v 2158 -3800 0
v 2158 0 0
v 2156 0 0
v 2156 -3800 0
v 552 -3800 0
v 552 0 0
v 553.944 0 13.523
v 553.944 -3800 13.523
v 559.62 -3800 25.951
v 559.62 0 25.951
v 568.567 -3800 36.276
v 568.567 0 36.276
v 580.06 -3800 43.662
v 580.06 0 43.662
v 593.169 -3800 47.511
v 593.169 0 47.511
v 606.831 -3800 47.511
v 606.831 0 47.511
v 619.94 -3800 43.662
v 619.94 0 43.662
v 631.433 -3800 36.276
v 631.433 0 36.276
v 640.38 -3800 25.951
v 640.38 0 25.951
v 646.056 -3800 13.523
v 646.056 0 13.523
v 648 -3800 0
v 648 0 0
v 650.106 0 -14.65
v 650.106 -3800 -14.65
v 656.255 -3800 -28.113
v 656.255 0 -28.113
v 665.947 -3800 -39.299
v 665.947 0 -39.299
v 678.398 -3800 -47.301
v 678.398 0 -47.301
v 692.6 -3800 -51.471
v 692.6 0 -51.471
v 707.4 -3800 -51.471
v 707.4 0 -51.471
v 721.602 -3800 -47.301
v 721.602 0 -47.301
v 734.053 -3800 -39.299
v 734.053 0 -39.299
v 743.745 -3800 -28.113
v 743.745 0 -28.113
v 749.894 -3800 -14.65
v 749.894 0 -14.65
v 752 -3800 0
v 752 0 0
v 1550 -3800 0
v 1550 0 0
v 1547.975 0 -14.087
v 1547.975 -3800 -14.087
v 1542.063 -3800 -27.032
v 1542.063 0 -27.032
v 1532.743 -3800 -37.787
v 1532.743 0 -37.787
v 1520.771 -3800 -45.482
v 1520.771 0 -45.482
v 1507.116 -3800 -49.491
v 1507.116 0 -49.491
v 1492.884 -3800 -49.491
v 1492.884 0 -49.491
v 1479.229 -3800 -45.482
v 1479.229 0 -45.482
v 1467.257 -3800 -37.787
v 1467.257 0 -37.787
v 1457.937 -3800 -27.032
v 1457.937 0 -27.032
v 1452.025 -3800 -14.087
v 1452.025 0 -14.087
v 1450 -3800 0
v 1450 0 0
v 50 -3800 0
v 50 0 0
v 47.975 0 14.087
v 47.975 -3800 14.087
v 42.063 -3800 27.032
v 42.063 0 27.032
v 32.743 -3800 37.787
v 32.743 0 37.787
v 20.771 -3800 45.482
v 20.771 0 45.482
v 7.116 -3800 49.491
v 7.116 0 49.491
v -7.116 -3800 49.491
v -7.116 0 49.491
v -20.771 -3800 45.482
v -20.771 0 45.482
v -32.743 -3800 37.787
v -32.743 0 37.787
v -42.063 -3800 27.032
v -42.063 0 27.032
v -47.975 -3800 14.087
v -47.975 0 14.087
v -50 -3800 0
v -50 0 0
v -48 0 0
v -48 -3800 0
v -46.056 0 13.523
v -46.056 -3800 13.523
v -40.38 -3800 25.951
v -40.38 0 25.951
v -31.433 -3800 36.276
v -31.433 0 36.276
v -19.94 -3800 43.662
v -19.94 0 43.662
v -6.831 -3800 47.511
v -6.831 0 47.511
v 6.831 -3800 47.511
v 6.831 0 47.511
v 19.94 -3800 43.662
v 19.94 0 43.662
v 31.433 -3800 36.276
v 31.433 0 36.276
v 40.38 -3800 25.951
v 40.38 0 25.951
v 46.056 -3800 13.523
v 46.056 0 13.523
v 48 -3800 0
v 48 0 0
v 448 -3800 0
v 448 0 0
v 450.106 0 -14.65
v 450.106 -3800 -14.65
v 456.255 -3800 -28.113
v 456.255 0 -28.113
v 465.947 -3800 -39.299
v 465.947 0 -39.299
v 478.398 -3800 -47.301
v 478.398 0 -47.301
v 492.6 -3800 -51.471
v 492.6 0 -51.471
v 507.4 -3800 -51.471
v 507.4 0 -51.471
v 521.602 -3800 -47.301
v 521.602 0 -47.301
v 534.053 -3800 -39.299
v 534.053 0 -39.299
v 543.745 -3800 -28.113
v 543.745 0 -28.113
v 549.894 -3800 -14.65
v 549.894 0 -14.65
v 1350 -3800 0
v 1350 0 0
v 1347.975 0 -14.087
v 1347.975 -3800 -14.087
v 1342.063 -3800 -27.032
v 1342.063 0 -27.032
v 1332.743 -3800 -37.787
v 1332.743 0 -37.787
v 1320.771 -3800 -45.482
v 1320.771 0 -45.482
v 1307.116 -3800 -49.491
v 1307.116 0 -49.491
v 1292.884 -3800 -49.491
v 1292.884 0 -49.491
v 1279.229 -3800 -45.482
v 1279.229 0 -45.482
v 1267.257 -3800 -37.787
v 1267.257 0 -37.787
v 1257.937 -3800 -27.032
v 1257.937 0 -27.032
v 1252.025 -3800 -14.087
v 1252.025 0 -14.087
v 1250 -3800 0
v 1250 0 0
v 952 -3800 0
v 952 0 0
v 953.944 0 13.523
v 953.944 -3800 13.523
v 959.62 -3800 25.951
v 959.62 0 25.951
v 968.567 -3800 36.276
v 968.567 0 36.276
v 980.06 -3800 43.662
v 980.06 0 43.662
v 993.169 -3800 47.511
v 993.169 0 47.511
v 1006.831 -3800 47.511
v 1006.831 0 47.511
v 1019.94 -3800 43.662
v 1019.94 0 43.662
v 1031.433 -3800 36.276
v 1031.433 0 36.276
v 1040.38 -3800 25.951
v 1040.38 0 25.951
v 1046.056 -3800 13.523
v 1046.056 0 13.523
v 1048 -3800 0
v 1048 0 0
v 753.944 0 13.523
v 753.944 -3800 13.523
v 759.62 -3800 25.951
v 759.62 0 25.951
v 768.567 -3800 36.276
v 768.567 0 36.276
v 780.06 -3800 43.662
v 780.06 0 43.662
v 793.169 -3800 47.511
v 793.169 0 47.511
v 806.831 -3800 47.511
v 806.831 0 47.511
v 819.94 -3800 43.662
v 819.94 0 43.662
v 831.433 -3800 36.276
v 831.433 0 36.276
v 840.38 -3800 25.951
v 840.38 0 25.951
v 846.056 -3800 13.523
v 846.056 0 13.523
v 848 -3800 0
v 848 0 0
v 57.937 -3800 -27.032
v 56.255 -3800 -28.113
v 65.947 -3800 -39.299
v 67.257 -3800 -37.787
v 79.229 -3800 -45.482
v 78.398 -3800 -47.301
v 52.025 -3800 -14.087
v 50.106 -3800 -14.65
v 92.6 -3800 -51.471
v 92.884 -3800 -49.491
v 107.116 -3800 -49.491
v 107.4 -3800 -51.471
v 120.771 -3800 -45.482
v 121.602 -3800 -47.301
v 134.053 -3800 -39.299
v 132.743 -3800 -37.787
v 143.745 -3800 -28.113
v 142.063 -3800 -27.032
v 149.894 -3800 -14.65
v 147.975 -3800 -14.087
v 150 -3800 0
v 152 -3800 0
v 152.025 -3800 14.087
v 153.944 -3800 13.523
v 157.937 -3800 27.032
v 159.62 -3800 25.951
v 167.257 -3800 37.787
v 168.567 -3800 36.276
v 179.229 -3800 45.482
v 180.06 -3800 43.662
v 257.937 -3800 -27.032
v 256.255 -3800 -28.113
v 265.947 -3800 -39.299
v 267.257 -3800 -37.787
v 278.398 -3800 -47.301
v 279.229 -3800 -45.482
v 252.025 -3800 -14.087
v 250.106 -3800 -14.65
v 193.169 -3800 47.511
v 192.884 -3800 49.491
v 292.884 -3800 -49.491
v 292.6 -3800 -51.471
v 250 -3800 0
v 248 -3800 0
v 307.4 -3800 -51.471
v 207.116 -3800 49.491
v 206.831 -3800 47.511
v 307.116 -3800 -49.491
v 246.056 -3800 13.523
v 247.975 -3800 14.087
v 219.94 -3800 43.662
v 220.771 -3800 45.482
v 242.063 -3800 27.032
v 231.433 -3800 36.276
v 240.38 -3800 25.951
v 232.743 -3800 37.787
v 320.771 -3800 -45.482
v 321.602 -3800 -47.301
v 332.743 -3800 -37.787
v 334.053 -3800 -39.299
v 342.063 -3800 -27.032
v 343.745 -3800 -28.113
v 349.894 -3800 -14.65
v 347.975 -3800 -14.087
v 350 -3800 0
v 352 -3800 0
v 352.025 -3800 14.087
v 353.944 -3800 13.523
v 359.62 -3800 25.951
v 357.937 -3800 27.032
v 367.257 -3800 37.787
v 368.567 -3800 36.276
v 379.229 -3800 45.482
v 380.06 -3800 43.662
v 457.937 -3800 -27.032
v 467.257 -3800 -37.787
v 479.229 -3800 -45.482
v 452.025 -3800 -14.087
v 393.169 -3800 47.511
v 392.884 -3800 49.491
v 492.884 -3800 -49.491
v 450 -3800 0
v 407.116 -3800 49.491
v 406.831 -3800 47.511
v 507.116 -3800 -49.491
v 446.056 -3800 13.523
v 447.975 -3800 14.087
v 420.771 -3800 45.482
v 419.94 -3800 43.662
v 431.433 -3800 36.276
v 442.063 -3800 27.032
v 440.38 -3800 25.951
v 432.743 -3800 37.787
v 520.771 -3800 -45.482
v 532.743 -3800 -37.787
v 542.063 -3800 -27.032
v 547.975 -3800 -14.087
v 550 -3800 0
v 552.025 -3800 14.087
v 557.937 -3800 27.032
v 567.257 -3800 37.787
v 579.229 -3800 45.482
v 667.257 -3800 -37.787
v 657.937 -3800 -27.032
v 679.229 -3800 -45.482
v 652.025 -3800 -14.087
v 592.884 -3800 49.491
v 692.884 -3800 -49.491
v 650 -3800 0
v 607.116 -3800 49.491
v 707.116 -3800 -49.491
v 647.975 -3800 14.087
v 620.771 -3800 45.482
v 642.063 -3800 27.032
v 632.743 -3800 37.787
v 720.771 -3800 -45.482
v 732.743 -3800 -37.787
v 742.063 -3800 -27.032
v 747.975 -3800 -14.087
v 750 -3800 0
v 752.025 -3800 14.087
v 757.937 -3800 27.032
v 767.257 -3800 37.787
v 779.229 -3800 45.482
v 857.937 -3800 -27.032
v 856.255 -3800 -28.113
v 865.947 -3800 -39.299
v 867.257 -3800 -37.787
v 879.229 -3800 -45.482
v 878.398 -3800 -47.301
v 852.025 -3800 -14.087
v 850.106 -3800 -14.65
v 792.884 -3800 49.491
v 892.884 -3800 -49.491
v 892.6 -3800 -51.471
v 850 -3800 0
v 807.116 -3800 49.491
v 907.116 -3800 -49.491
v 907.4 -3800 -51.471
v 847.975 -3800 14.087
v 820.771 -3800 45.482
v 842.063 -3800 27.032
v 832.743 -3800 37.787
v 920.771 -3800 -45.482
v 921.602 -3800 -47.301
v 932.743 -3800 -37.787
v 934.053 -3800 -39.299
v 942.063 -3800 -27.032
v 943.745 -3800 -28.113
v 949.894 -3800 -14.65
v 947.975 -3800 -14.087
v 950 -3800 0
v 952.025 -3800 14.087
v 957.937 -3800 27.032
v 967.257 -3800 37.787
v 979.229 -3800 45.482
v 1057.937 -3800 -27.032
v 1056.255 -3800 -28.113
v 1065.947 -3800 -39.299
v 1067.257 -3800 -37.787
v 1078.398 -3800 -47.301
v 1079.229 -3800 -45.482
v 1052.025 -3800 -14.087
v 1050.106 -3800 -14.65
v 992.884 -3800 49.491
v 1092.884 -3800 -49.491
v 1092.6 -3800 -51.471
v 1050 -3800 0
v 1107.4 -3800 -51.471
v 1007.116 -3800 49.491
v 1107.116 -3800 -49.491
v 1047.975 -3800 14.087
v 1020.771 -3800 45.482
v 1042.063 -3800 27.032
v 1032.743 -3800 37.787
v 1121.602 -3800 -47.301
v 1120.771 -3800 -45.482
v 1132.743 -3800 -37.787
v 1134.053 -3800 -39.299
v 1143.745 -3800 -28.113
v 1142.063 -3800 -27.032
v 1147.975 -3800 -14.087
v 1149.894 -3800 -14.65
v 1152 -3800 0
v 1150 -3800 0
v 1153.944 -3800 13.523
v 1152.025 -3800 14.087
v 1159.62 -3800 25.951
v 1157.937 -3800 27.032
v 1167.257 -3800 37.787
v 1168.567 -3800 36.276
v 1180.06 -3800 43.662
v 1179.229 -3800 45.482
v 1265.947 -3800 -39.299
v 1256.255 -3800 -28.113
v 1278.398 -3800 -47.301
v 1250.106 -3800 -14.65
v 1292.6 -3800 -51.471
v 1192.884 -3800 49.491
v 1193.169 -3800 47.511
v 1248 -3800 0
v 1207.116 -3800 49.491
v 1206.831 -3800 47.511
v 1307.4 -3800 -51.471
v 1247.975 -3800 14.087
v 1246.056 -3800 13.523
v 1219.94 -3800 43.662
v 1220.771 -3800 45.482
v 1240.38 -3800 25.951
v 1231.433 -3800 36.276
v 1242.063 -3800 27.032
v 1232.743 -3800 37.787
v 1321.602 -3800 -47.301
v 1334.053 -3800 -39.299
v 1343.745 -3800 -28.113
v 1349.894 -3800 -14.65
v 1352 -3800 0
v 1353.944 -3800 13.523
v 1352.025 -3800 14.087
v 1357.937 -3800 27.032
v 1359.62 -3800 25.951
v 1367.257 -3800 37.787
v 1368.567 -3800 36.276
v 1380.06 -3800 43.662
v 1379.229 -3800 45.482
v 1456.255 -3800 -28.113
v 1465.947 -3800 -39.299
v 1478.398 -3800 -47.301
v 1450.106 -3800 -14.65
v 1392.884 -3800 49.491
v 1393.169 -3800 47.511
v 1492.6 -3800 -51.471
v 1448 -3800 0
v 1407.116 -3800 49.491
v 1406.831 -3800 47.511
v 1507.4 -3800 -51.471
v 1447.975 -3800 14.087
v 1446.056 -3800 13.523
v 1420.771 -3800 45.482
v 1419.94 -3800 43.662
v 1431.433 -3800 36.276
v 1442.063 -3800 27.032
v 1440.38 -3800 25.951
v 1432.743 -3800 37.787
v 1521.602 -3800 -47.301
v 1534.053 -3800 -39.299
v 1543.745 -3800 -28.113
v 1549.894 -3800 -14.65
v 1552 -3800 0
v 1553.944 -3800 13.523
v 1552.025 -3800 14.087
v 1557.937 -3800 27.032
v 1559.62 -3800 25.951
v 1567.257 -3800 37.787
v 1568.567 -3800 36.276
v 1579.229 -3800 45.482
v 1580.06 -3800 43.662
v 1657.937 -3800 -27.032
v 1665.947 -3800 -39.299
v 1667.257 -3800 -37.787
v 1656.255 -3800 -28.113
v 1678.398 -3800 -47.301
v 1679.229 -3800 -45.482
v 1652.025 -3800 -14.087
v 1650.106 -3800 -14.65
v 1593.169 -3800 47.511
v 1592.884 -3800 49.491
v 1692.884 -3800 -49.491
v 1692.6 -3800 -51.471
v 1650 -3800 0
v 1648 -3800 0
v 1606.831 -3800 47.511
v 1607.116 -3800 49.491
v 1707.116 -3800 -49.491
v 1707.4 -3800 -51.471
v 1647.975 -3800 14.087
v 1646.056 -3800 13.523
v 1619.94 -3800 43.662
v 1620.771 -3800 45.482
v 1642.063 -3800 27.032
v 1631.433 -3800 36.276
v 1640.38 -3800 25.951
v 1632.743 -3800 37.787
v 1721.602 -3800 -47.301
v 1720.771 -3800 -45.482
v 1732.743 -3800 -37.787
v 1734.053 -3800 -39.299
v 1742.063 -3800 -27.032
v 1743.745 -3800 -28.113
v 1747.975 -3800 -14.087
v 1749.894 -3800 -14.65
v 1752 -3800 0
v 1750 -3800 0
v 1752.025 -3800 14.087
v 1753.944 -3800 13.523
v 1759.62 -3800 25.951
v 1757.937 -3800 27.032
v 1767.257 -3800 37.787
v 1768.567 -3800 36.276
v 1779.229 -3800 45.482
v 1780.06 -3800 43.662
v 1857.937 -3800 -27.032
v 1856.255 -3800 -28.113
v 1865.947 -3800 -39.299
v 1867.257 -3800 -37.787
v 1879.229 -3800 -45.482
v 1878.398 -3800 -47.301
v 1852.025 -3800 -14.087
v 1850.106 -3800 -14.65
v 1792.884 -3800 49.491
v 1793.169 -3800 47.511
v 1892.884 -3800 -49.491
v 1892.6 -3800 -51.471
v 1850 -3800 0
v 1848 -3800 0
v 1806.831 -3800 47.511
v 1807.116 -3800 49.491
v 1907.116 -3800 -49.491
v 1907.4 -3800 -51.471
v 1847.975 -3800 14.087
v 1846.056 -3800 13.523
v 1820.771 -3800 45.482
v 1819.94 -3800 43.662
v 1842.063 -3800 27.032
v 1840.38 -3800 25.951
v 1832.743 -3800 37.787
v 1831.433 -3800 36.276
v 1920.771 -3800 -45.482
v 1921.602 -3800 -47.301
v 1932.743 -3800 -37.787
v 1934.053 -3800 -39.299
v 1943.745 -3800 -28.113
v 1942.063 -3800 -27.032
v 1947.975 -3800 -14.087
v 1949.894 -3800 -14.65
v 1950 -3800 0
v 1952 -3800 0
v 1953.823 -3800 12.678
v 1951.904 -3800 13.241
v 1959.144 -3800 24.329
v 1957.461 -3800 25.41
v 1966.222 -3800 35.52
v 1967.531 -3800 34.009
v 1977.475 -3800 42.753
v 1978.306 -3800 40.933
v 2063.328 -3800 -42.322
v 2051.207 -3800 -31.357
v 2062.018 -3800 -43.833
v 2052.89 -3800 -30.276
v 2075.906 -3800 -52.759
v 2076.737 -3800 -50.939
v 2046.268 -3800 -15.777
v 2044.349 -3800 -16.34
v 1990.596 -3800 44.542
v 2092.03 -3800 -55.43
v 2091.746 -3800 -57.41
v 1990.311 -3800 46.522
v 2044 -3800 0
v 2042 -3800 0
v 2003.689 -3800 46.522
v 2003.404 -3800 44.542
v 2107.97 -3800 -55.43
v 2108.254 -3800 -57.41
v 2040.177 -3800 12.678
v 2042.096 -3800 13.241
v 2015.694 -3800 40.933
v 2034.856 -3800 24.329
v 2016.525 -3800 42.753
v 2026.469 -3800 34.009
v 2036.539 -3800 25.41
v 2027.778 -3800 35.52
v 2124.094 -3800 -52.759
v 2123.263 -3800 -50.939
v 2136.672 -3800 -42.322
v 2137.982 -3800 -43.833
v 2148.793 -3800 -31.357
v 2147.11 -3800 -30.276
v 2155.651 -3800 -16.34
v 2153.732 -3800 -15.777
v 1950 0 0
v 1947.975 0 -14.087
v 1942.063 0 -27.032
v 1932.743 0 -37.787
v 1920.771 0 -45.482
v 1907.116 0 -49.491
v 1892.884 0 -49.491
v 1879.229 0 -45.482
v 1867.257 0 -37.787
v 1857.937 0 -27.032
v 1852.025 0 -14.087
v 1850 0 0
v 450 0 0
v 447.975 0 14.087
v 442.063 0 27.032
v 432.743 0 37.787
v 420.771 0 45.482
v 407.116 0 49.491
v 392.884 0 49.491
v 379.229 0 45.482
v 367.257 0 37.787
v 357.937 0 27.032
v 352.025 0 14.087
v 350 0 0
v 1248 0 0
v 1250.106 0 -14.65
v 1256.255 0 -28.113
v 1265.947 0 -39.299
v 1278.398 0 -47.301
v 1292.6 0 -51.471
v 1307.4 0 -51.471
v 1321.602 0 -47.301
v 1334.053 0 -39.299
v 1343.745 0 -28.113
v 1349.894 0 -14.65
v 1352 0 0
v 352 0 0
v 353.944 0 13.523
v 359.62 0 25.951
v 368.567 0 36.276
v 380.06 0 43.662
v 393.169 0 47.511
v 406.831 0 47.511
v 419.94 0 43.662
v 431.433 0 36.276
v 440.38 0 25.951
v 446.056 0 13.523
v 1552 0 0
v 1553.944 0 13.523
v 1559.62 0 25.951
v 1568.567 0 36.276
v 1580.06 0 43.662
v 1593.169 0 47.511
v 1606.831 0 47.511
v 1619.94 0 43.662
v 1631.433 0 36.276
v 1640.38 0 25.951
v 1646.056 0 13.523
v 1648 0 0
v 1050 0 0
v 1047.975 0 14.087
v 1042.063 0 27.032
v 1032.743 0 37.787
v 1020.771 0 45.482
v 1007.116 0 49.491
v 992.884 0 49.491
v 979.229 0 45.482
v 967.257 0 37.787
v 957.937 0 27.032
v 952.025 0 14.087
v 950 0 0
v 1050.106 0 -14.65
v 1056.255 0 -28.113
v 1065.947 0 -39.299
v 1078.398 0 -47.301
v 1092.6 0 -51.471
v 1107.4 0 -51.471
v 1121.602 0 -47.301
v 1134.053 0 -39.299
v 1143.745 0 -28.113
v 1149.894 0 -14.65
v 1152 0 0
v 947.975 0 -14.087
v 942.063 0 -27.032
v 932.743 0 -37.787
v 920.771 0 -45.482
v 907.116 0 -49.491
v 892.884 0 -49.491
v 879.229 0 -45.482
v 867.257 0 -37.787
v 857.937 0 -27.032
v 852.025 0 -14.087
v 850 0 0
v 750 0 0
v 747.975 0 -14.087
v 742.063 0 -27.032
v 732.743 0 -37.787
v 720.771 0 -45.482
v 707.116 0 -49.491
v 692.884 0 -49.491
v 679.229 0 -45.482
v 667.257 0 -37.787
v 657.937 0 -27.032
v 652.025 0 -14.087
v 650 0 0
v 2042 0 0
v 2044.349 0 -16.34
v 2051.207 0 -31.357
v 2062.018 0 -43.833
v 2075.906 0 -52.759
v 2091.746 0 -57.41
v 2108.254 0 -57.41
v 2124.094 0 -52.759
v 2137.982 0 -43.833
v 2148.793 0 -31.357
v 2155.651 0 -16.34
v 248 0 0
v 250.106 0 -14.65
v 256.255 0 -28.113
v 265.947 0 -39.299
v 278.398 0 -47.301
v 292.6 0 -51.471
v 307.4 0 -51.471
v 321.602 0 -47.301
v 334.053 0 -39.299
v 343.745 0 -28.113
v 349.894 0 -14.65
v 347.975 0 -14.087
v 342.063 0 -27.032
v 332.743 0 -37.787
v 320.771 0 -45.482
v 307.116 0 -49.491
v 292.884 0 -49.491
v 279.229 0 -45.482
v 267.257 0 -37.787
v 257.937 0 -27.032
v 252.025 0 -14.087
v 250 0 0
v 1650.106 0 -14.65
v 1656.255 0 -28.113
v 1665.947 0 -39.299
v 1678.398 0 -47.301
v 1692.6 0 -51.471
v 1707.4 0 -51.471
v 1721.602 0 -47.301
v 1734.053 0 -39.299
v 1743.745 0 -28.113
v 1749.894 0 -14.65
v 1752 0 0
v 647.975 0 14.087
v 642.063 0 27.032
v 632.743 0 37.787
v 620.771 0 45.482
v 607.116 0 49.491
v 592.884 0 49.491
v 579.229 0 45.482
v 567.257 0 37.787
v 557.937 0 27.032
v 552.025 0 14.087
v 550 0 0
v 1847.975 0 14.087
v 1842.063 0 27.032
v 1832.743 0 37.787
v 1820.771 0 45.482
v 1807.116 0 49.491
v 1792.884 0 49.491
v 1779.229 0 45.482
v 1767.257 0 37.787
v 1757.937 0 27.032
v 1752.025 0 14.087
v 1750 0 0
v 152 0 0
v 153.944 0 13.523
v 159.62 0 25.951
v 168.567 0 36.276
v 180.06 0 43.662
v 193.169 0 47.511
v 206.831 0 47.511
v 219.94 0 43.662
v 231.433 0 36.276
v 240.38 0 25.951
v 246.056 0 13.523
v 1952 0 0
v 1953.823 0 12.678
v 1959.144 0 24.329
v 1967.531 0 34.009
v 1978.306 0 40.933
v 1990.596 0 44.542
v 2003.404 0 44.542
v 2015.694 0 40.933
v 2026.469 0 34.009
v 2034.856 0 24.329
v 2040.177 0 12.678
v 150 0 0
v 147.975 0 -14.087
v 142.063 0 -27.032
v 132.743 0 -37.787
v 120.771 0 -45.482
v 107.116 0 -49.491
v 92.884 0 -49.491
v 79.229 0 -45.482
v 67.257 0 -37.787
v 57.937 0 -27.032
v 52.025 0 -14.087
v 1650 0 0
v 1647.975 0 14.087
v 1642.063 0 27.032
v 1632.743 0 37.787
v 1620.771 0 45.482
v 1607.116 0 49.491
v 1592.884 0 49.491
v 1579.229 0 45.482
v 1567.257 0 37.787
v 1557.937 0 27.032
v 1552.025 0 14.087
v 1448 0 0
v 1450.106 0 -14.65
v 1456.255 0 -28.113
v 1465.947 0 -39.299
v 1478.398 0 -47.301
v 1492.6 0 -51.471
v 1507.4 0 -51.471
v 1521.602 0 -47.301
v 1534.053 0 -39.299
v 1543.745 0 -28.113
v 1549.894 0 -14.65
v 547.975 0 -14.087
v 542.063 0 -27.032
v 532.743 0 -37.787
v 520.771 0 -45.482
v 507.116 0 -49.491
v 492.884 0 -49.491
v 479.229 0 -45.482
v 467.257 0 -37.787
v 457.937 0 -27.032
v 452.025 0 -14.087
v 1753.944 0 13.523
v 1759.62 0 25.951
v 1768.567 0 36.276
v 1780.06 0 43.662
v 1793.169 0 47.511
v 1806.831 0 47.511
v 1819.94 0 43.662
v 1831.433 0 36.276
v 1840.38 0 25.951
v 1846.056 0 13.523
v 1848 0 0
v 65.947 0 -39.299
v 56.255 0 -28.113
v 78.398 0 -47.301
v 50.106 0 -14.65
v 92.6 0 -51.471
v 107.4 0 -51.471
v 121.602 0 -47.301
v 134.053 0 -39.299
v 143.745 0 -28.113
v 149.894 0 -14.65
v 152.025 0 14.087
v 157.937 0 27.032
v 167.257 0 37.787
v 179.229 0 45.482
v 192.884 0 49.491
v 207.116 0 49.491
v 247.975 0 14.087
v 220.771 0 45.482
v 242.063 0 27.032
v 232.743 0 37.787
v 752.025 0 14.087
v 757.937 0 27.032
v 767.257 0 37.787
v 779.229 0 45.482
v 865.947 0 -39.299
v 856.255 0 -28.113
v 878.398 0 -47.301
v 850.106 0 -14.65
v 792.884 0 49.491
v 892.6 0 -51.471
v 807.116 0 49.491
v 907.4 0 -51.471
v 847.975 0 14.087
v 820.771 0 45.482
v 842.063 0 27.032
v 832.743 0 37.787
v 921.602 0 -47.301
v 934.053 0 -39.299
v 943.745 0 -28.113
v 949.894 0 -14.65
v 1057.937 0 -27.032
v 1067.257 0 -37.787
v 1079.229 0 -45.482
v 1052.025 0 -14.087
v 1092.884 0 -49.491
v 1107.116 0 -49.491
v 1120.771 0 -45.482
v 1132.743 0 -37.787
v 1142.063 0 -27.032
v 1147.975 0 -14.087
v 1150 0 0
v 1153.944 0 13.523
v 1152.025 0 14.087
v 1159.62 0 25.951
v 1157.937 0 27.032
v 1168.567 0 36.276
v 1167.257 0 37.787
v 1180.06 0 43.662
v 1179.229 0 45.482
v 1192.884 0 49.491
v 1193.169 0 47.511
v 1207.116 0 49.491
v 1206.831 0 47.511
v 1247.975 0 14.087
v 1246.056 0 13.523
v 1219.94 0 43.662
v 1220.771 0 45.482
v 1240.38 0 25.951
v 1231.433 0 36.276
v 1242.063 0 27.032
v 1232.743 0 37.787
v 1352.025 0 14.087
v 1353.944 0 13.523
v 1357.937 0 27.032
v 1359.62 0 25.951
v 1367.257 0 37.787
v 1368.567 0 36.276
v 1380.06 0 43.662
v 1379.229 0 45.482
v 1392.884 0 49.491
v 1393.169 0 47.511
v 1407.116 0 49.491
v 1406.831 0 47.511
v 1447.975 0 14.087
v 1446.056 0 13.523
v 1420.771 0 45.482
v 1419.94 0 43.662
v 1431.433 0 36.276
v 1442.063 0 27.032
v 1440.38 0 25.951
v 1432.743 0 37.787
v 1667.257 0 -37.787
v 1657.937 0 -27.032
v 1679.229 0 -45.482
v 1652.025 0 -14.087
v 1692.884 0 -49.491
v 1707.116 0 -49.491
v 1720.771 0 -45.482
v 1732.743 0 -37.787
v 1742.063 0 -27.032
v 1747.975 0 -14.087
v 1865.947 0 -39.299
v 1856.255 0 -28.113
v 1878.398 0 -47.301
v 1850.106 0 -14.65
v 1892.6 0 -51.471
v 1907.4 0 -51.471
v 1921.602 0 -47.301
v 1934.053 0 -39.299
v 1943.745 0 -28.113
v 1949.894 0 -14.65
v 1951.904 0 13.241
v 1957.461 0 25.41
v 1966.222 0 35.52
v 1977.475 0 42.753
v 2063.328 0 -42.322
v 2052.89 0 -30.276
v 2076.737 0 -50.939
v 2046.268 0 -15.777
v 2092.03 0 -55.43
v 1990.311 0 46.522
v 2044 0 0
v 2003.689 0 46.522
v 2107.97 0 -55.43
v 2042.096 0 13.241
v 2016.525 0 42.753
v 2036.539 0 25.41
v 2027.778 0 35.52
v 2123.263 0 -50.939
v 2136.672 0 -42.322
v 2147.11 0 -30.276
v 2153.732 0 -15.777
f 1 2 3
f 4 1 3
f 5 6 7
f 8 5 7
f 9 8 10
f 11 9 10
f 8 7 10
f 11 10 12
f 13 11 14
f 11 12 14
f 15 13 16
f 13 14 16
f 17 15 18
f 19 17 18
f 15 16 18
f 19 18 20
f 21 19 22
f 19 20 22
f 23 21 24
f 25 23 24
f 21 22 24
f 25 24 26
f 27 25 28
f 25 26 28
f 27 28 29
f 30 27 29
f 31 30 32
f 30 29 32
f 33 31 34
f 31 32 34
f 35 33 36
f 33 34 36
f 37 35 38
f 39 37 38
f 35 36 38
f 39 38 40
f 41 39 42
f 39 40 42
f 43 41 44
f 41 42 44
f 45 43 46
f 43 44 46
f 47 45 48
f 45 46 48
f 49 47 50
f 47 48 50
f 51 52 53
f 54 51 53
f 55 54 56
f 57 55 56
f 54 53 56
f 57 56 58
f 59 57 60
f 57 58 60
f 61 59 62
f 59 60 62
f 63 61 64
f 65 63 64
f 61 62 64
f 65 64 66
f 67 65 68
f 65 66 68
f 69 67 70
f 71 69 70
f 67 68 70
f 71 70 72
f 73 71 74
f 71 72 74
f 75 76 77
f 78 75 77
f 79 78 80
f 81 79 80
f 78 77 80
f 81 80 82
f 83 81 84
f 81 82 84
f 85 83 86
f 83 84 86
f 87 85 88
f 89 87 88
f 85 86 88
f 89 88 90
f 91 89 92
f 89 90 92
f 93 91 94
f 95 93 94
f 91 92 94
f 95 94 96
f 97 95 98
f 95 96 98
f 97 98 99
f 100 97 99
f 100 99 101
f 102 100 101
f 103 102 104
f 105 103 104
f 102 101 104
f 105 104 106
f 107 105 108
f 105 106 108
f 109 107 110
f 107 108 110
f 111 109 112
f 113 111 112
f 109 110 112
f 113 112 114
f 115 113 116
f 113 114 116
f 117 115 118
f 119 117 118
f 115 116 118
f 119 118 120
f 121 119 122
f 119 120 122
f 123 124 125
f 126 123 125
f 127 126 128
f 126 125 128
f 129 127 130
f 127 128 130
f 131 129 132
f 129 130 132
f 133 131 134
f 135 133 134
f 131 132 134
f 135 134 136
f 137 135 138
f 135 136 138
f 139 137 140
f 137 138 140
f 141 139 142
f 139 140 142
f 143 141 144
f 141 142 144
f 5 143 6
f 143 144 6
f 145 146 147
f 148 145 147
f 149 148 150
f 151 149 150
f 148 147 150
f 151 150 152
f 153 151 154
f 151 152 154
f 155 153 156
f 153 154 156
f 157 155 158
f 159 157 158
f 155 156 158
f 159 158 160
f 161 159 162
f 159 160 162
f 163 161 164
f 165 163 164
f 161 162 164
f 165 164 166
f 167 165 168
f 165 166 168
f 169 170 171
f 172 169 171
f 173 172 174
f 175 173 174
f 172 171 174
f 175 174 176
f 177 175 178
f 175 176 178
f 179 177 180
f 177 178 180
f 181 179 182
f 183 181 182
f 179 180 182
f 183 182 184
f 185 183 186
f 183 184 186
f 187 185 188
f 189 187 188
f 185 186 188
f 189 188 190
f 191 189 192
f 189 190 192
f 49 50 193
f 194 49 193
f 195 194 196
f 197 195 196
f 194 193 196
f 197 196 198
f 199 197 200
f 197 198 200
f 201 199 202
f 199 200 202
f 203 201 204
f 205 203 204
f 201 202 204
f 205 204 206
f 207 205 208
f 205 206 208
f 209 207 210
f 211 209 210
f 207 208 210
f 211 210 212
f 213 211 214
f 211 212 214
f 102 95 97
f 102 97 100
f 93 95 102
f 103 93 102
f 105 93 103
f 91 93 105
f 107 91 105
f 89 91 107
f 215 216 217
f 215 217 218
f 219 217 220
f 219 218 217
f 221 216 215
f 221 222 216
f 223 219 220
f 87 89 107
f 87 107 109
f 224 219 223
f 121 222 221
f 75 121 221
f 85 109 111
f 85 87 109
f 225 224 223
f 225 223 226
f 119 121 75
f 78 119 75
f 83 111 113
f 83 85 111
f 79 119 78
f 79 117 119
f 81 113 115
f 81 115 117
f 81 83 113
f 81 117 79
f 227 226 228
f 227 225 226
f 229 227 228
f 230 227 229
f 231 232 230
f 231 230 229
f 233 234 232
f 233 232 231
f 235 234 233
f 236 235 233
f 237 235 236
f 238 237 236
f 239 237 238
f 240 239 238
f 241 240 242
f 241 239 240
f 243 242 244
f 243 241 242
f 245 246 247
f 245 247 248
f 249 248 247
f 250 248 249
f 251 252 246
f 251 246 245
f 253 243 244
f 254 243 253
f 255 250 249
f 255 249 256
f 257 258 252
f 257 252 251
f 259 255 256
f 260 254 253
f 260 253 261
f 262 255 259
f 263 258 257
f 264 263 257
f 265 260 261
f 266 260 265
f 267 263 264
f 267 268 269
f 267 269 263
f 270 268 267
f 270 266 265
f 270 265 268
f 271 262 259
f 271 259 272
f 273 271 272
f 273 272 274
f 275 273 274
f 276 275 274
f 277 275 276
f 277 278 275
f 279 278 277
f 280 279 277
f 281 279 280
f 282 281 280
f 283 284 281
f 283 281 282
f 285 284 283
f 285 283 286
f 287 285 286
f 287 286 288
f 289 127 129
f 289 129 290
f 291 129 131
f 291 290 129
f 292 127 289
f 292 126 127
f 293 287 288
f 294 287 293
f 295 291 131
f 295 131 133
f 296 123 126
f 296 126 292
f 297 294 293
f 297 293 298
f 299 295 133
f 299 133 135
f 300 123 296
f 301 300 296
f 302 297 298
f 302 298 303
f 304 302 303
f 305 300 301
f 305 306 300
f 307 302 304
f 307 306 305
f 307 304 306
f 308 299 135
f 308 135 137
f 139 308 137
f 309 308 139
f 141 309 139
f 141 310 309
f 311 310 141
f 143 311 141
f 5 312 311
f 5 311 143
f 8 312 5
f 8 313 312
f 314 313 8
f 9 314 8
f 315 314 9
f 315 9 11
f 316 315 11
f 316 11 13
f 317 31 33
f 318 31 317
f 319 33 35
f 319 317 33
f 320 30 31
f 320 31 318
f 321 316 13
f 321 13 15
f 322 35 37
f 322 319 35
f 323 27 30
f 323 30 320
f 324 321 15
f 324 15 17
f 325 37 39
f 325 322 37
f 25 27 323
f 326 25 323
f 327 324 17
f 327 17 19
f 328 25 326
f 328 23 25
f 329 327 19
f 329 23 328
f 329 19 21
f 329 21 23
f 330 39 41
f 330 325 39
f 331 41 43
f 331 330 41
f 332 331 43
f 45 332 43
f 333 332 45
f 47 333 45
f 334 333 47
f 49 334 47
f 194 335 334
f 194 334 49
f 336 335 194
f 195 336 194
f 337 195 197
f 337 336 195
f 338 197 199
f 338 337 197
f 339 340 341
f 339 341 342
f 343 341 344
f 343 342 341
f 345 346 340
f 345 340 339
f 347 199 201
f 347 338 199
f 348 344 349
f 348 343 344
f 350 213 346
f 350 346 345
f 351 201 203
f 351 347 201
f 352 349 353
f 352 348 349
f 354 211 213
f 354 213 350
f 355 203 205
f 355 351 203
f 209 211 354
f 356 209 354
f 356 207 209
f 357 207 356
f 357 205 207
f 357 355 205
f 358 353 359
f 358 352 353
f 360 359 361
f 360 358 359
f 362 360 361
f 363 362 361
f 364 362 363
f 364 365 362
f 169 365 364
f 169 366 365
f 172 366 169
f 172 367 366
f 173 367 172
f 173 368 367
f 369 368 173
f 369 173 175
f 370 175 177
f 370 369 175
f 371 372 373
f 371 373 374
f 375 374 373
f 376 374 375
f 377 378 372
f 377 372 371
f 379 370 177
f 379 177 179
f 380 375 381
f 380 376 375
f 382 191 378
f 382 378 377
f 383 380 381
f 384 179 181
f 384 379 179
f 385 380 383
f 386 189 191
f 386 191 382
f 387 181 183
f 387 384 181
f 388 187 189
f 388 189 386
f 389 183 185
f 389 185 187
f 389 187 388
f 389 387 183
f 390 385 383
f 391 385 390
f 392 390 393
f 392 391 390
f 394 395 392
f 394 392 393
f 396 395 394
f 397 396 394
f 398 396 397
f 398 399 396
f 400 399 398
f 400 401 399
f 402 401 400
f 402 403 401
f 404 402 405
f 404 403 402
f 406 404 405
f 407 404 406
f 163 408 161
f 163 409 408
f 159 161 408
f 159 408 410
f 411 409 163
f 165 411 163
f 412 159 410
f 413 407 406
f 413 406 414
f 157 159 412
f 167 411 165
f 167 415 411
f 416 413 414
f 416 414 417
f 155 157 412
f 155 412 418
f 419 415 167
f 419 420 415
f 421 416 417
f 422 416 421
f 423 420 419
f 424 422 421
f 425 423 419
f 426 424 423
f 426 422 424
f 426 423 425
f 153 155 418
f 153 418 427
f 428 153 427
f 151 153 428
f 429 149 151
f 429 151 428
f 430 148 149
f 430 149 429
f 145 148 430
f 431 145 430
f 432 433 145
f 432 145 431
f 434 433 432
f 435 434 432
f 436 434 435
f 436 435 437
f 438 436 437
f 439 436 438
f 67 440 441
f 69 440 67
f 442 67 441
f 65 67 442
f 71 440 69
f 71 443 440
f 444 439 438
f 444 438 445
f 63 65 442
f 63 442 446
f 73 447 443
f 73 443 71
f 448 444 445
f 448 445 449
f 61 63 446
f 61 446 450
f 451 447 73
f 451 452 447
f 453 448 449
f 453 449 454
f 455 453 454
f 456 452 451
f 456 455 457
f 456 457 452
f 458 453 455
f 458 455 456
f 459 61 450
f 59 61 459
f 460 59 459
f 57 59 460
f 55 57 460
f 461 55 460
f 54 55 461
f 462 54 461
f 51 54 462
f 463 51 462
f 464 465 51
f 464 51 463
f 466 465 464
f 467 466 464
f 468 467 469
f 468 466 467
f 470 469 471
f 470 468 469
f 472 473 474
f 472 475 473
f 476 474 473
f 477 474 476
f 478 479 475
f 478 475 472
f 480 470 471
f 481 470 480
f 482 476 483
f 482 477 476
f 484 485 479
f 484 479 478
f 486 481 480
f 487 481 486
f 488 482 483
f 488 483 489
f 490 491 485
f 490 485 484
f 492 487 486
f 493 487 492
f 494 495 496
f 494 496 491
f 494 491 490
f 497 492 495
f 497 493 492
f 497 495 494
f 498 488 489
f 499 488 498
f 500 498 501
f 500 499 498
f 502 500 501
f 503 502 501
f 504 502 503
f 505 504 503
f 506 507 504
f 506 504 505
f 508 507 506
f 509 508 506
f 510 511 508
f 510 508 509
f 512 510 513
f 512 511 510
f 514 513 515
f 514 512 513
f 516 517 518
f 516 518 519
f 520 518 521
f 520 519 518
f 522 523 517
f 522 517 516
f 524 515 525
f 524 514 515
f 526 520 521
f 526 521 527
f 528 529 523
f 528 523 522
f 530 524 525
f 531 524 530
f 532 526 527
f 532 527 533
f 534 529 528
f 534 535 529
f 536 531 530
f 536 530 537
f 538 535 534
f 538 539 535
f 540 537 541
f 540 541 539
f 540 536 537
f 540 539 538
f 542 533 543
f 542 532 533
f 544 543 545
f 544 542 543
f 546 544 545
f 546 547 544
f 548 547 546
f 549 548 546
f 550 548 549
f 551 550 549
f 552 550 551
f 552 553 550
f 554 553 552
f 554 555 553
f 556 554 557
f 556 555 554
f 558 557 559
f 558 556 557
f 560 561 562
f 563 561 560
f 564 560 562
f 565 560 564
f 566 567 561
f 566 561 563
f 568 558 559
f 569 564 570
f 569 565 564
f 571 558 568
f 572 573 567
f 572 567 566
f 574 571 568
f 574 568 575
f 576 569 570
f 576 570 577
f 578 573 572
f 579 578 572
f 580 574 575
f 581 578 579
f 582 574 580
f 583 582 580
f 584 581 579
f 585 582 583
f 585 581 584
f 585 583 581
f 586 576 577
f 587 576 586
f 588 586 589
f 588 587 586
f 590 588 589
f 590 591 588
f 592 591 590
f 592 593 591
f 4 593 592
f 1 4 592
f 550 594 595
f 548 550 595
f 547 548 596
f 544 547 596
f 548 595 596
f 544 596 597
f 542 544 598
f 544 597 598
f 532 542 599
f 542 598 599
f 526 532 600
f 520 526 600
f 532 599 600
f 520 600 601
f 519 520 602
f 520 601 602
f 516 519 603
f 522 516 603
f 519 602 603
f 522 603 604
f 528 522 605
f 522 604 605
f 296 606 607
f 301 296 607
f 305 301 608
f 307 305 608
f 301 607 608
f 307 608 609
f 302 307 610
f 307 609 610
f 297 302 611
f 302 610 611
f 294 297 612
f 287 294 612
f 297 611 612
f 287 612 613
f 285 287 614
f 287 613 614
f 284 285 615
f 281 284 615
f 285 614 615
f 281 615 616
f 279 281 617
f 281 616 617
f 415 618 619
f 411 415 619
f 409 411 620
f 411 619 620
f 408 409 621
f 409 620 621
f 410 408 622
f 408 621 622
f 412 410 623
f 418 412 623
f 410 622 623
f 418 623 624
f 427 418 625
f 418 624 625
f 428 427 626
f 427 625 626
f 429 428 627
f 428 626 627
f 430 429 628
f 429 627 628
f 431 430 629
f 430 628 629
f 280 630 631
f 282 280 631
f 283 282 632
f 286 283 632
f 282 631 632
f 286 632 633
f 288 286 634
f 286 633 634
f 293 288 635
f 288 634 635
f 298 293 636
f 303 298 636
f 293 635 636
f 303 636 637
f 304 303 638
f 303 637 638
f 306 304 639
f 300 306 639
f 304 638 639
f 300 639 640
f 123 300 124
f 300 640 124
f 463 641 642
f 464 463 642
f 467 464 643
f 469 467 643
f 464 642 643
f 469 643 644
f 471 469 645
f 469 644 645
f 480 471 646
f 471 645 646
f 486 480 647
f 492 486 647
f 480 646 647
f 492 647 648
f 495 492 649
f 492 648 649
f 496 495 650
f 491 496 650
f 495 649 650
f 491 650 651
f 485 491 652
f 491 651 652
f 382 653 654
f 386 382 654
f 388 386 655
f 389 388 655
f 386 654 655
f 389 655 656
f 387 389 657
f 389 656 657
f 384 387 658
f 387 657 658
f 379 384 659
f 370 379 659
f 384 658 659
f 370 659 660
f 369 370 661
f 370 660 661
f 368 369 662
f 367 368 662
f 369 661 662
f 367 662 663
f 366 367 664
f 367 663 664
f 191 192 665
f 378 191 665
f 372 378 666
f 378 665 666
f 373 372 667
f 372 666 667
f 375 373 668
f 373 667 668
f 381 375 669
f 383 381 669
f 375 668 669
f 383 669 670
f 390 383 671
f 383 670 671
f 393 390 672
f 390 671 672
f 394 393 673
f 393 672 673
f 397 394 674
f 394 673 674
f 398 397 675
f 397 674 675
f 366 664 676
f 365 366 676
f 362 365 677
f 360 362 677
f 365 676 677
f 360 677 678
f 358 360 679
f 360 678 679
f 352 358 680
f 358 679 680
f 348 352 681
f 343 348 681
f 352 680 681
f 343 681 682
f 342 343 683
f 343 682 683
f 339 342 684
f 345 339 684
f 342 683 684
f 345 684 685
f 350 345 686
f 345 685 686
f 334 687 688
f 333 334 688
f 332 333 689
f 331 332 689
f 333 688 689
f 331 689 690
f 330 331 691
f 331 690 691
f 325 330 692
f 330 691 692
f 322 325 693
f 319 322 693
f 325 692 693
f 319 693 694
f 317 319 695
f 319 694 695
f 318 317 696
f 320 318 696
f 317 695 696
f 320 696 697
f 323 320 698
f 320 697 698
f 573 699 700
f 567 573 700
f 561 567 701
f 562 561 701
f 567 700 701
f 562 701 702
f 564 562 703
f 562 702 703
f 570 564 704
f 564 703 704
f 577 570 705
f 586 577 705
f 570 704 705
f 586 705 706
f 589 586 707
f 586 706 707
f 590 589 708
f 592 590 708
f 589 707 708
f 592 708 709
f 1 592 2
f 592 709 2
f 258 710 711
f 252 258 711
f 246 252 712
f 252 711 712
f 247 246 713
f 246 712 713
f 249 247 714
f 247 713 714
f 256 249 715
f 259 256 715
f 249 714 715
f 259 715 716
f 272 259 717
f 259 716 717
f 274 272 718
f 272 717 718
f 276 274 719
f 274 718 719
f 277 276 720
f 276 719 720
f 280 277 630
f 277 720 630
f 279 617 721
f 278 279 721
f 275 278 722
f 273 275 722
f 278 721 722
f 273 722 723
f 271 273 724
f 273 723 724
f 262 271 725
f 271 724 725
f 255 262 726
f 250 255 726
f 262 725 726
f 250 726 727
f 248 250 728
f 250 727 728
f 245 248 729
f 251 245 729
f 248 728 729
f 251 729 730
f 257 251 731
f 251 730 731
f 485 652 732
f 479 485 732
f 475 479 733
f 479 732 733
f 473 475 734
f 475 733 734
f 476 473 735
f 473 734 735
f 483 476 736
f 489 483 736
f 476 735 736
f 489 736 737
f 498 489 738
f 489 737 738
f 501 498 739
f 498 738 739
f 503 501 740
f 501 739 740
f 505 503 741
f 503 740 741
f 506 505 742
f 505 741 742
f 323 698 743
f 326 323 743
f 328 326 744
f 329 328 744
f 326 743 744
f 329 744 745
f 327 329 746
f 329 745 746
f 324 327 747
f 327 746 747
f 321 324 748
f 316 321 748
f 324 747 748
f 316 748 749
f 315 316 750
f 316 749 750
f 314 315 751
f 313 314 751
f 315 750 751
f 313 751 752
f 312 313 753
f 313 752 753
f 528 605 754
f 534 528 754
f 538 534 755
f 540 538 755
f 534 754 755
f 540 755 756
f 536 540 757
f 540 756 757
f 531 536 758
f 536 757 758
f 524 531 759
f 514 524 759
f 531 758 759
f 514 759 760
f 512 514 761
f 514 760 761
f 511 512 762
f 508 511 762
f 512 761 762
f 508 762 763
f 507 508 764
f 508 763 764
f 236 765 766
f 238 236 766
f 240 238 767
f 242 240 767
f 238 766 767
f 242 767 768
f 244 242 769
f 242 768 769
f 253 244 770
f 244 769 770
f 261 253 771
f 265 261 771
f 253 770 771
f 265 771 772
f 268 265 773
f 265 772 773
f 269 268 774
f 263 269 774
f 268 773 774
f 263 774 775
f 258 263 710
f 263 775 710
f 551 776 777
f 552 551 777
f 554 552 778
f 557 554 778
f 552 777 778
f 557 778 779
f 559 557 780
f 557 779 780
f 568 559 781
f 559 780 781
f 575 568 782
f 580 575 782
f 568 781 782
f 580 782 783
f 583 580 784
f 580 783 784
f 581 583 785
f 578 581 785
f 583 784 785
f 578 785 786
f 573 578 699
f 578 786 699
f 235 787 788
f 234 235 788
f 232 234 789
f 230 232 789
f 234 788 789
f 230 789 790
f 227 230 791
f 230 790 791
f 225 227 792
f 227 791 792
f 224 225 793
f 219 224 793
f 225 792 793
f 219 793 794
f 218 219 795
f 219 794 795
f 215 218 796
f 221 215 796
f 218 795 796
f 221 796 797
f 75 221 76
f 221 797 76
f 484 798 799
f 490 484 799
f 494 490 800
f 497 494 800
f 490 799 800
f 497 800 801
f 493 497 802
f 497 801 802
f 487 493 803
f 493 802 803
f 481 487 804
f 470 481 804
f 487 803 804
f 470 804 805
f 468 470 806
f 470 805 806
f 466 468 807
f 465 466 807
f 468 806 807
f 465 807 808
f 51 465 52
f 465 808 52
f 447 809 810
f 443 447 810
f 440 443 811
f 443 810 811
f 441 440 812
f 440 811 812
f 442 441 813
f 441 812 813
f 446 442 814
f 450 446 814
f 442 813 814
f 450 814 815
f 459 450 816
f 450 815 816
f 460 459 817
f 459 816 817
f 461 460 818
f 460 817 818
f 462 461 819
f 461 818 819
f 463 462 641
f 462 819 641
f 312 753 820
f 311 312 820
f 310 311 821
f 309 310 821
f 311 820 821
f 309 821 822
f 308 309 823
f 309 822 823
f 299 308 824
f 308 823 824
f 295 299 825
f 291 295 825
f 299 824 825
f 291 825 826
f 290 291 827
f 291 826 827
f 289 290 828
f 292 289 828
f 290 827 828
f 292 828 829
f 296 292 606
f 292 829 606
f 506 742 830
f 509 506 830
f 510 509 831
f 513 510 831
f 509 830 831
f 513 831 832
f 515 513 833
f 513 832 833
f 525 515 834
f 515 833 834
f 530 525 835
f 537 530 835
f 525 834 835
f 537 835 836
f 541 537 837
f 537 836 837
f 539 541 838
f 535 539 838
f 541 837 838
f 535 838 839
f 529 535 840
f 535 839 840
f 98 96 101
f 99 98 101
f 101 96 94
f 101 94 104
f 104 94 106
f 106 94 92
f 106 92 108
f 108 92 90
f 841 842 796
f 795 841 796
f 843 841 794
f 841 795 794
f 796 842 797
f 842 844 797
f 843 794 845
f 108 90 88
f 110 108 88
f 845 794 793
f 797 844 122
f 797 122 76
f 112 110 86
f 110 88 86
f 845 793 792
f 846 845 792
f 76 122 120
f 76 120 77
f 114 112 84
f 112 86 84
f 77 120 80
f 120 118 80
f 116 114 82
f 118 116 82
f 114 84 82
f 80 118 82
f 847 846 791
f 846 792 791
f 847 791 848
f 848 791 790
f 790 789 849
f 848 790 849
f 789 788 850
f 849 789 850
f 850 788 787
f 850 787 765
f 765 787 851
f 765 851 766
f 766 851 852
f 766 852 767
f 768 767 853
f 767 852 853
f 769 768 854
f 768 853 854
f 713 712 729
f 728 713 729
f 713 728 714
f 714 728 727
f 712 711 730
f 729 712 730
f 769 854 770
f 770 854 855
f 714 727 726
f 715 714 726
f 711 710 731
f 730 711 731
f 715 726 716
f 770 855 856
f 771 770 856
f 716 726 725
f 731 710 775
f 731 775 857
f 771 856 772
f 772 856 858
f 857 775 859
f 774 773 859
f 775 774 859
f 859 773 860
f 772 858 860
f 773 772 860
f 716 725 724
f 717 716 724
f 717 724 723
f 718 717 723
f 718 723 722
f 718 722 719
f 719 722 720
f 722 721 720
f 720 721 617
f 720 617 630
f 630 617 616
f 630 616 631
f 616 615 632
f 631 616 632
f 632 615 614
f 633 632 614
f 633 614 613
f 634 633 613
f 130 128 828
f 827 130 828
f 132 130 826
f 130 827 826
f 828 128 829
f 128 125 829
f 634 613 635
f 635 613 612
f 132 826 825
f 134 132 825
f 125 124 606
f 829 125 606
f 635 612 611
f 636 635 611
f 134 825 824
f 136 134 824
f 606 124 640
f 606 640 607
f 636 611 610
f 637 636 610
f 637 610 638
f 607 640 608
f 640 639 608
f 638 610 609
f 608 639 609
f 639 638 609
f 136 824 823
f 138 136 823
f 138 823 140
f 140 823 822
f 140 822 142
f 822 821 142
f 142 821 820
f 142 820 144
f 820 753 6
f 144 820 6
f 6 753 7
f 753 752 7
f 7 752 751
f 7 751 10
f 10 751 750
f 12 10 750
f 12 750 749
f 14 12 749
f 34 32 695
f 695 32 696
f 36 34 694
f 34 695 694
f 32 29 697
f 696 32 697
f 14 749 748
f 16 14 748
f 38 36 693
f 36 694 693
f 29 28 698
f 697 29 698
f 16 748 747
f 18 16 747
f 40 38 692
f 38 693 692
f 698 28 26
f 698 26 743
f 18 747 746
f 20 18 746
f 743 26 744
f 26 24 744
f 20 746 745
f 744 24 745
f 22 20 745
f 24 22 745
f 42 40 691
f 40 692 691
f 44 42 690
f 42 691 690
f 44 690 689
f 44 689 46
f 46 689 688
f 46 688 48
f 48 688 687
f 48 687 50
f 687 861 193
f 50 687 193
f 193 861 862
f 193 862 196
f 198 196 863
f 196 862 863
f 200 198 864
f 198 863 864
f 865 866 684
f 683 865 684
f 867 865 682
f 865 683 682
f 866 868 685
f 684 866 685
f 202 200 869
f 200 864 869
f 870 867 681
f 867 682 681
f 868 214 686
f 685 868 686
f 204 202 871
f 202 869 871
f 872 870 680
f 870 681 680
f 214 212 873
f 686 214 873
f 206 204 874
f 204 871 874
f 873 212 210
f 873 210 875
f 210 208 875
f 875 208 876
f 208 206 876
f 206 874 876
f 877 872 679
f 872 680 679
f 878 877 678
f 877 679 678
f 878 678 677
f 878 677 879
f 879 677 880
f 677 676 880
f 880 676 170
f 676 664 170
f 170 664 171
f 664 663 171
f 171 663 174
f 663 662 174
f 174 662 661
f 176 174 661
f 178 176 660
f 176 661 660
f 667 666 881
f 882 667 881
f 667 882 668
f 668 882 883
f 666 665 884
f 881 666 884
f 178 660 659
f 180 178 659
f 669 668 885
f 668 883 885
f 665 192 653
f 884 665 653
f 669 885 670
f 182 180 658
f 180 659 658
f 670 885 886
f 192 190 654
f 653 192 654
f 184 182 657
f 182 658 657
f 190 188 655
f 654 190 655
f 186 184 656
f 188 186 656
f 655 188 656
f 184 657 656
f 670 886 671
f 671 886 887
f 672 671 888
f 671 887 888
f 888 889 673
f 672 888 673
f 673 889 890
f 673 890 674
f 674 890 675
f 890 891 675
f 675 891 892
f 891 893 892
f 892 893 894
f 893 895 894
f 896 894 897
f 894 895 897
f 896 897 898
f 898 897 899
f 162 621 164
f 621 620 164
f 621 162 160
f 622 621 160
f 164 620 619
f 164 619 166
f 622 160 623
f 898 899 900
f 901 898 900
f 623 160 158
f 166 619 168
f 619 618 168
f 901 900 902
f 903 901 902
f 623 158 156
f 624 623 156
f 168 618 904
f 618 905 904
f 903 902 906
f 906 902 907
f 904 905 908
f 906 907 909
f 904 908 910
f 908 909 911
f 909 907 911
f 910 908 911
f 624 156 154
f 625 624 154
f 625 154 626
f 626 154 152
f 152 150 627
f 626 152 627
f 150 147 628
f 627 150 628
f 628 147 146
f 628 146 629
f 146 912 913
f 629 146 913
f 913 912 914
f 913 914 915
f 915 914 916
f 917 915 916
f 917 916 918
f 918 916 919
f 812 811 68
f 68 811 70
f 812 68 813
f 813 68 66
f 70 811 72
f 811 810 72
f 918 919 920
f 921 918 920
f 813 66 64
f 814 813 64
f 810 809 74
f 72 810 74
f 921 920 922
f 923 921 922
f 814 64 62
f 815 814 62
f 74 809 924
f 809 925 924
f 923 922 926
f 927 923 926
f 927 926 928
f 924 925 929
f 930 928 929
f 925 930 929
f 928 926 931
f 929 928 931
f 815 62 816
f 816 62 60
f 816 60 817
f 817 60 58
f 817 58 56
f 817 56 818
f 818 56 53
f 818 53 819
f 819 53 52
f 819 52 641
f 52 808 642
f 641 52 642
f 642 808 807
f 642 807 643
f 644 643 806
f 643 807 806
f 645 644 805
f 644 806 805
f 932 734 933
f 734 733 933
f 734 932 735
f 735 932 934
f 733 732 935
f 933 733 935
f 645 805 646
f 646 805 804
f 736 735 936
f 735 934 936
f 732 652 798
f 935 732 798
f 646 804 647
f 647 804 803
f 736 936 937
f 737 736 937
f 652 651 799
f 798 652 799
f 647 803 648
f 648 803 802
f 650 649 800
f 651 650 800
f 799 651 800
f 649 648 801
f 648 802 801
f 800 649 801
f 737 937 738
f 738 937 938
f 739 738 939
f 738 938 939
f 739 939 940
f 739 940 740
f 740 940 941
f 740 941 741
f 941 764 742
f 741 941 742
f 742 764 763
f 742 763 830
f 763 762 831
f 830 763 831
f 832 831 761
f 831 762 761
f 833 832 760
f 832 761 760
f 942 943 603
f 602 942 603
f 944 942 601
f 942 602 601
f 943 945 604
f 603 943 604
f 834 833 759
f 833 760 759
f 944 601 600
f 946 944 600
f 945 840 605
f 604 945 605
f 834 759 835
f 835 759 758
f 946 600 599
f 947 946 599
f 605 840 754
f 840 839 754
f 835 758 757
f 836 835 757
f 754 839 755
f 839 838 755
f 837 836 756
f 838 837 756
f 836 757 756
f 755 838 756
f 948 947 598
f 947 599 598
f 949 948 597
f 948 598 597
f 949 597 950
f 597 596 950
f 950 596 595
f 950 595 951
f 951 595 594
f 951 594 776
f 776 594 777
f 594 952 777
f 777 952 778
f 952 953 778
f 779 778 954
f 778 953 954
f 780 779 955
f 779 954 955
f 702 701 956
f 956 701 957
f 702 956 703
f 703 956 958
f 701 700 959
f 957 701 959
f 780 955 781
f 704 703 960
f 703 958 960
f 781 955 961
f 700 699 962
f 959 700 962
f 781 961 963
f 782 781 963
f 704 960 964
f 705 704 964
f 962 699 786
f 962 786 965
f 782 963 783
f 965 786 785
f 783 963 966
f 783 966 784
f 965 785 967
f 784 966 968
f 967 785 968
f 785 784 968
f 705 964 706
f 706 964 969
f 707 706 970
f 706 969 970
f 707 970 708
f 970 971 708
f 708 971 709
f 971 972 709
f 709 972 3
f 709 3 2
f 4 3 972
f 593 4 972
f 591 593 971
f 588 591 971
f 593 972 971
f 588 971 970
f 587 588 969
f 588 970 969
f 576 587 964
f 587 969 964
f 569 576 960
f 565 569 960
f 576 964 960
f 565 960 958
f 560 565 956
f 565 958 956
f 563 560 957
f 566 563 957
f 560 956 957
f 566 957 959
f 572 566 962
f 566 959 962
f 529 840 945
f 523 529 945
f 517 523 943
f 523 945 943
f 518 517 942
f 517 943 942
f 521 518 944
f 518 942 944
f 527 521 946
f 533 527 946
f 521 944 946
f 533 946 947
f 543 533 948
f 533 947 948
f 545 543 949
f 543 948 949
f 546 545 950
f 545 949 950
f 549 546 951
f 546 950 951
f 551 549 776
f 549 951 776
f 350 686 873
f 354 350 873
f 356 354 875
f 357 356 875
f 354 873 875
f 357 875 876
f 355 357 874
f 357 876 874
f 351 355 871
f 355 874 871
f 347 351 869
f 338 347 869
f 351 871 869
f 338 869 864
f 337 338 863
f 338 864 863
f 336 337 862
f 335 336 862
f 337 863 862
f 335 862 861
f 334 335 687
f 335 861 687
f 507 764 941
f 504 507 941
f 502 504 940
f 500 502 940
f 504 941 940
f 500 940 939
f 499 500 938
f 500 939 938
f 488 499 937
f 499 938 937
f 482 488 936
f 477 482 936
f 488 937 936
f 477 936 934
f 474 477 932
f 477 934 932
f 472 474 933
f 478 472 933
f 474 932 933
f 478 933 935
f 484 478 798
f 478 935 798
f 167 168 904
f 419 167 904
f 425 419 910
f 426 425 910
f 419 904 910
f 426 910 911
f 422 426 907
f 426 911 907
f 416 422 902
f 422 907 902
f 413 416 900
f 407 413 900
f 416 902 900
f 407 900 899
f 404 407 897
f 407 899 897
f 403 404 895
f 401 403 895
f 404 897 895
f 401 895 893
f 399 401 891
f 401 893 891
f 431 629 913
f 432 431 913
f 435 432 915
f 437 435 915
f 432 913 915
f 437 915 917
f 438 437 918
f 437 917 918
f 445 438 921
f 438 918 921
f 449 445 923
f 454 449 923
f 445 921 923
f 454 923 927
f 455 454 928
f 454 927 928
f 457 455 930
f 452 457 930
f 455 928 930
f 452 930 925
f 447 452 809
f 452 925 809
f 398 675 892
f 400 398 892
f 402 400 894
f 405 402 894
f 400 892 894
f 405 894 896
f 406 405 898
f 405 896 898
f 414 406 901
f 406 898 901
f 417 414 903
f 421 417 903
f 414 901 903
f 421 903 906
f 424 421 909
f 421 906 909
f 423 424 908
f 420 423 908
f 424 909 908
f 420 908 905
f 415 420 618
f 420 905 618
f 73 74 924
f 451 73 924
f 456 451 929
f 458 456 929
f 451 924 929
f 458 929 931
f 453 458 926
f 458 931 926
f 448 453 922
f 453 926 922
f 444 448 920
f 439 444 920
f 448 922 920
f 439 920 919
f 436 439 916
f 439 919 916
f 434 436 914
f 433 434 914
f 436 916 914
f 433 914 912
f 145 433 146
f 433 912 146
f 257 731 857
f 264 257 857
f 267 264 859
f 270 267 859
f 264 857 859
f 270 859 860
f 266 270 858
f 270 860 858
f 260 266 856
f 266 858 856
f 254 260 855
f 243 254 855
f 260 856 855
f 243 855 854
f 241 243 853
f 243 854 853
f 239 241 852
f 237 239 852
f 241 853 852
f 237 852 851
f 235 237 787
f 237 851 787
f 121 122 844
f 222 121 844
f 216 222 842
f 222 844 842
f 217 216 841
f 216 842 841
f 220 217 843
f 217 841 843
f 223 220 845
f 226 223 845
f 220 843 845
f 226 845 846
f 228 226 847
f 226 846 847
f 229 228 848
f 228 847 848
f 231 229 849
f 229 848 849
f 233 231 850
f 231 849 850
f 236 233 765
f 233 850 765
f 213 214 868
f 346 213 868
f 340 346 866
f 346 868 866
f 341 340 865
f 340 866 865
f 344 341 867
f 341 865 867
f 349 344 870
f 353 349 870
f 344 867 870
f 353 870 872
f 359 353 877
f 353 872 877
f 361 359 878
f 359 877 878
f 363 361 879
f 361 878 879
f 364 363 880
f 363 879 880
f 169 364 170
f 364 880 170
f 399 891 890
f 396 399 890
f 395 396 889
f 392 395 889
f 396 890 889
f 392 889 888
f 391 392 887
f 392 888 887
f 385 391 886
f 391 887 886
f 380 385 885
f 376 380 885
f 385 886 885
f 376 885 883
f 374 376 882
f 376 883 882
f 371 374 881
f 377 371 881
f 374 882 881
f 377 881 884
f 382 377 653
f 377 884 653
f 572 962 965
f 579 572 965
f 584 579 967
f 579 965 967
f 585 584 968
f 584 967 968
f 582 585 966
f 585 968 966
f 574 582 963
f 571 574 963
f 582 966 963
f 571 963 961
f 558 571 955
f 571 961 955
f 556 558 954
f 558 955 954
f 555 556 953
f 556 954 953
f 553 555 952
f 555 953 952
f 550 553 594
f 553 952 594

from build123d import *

# Parameters (mm, degrees)
F1_DEPTH = 3800


with BuildPart() as f1:
    # F0 (on Front) → F1 (new body)
    with BuildSketch(Plane.XZ):
        with BuildLine():
            ThreePointArc((150, 0), (100, -50), (50, 0))
            ThreePointArc((50, 0), (0, 50), (-50, 0))
            Line((-50, 0), (-48, 0))
            ThreePointArc((-48, 0), (0, 48), (48, 0))
            ThreePointArc((48, 0), (100, -52), (152, 0))
            ThreePointArc((152, 0), (200, 48), (248, 0))
            ThreePointArc((248, 0), (300, -52), (352, 0))
            ThreePointArc((352, 0), (400, 48), (448, 0))
            ThreePointArc((448, 0), (500, -52), (552, 0))
            ThreePointArc((552, 0), (600, 48), (648, 0))
            ThreePointArc((648, 0), (700, -52), (752, 0))
            ThreePointArc((752, 0), (800, 48), (848, 0))
            ThreePointArc((848, 0), (900, -52), (952, 0))
            ThreePointArc((952, 0), (1000, 48), (1048, 0))
            ThreePointArc((1048, 0), (1100, -52), (1152, 0))
            ThreePointArc((1152, 0), (1200, 48), (1248, 0))
            ThreePointArc((1248, 0), (1300, -52), (1352, 0))
            ThreePointArc((1352, 0), (1400, 48), (1448, 0))
            ThreePointArc((1448, 0), (1500, -52), (1552, 0))
            ThreePointArc((1552, 0), (1600, 48), (1648, 0))
            ThreePointArc((1648, 0), (1700, -52), (1752, 0))
            ThreePointArc((1752, 0), (1800, 48), (1848, 0))
            ThreePointArc((1848, 0), (1900, -52), (1952, 0))
            ThreePointArc((1952, 0), (1997, 45), (2042, 0))
            ThreePointArc((2042, 0), (2100, -58), (2158, 0))
            Line((2158, 0), (2156, 0))
            ThreePointArc((2156, 0), (2100, -56), (2044, 0))
            ThreePointArc((2044, 0), (1997, 47), (1950, 0))
            ThreePointArc((1950, 0), (1900, -50), (1850, 0))
            ThreePointArc((1850, 0), (1800, 50), (1750, 0))
            ThreePointArc((1750, 0), (1700, -50), (1650, 0))
            ThreePointArc((1650, 0), (1600, 50), (1550, 0))
            ThreePointArc((1550, 0), (1500, -50), (1450, 0))
            ThreePointArc((1450, 0), (1400, 50), (1350, 0))
            ThreePointArc((1350, 0), (1300, -50), (1250, 0))
            ThreePointArc((1250, 0), (1200, 50), (1150, 0))
            ThreePointArc((1150, 0), (1100, -50), (1050, 0))
            ThreePointArc((1050, 0), (1000, 50), (950, 0))
            ThreePointArc((950, 0), (900, -50), (850, 0))
            ThreePointArc((850, 0), (800, 50), (750, 0))
            ThreePointArc((750, 0), (700, -50), (650, 0))
            ThreePointArc((650, 0), (600, 50), (550, 0))
            ThreePointArc((550, 0), (500, -50), (450, 0))
            ThreePointArc((450, 0), (400, 50), (350, 0))
            ThreePointArc((350, 0), (300, -50), (250, 0))
            ThreePointArc((250, 0), (200, 50), (150, 0))
        make_face()
    extrude(amount=F1_DEPTH)


solid = f1.part
